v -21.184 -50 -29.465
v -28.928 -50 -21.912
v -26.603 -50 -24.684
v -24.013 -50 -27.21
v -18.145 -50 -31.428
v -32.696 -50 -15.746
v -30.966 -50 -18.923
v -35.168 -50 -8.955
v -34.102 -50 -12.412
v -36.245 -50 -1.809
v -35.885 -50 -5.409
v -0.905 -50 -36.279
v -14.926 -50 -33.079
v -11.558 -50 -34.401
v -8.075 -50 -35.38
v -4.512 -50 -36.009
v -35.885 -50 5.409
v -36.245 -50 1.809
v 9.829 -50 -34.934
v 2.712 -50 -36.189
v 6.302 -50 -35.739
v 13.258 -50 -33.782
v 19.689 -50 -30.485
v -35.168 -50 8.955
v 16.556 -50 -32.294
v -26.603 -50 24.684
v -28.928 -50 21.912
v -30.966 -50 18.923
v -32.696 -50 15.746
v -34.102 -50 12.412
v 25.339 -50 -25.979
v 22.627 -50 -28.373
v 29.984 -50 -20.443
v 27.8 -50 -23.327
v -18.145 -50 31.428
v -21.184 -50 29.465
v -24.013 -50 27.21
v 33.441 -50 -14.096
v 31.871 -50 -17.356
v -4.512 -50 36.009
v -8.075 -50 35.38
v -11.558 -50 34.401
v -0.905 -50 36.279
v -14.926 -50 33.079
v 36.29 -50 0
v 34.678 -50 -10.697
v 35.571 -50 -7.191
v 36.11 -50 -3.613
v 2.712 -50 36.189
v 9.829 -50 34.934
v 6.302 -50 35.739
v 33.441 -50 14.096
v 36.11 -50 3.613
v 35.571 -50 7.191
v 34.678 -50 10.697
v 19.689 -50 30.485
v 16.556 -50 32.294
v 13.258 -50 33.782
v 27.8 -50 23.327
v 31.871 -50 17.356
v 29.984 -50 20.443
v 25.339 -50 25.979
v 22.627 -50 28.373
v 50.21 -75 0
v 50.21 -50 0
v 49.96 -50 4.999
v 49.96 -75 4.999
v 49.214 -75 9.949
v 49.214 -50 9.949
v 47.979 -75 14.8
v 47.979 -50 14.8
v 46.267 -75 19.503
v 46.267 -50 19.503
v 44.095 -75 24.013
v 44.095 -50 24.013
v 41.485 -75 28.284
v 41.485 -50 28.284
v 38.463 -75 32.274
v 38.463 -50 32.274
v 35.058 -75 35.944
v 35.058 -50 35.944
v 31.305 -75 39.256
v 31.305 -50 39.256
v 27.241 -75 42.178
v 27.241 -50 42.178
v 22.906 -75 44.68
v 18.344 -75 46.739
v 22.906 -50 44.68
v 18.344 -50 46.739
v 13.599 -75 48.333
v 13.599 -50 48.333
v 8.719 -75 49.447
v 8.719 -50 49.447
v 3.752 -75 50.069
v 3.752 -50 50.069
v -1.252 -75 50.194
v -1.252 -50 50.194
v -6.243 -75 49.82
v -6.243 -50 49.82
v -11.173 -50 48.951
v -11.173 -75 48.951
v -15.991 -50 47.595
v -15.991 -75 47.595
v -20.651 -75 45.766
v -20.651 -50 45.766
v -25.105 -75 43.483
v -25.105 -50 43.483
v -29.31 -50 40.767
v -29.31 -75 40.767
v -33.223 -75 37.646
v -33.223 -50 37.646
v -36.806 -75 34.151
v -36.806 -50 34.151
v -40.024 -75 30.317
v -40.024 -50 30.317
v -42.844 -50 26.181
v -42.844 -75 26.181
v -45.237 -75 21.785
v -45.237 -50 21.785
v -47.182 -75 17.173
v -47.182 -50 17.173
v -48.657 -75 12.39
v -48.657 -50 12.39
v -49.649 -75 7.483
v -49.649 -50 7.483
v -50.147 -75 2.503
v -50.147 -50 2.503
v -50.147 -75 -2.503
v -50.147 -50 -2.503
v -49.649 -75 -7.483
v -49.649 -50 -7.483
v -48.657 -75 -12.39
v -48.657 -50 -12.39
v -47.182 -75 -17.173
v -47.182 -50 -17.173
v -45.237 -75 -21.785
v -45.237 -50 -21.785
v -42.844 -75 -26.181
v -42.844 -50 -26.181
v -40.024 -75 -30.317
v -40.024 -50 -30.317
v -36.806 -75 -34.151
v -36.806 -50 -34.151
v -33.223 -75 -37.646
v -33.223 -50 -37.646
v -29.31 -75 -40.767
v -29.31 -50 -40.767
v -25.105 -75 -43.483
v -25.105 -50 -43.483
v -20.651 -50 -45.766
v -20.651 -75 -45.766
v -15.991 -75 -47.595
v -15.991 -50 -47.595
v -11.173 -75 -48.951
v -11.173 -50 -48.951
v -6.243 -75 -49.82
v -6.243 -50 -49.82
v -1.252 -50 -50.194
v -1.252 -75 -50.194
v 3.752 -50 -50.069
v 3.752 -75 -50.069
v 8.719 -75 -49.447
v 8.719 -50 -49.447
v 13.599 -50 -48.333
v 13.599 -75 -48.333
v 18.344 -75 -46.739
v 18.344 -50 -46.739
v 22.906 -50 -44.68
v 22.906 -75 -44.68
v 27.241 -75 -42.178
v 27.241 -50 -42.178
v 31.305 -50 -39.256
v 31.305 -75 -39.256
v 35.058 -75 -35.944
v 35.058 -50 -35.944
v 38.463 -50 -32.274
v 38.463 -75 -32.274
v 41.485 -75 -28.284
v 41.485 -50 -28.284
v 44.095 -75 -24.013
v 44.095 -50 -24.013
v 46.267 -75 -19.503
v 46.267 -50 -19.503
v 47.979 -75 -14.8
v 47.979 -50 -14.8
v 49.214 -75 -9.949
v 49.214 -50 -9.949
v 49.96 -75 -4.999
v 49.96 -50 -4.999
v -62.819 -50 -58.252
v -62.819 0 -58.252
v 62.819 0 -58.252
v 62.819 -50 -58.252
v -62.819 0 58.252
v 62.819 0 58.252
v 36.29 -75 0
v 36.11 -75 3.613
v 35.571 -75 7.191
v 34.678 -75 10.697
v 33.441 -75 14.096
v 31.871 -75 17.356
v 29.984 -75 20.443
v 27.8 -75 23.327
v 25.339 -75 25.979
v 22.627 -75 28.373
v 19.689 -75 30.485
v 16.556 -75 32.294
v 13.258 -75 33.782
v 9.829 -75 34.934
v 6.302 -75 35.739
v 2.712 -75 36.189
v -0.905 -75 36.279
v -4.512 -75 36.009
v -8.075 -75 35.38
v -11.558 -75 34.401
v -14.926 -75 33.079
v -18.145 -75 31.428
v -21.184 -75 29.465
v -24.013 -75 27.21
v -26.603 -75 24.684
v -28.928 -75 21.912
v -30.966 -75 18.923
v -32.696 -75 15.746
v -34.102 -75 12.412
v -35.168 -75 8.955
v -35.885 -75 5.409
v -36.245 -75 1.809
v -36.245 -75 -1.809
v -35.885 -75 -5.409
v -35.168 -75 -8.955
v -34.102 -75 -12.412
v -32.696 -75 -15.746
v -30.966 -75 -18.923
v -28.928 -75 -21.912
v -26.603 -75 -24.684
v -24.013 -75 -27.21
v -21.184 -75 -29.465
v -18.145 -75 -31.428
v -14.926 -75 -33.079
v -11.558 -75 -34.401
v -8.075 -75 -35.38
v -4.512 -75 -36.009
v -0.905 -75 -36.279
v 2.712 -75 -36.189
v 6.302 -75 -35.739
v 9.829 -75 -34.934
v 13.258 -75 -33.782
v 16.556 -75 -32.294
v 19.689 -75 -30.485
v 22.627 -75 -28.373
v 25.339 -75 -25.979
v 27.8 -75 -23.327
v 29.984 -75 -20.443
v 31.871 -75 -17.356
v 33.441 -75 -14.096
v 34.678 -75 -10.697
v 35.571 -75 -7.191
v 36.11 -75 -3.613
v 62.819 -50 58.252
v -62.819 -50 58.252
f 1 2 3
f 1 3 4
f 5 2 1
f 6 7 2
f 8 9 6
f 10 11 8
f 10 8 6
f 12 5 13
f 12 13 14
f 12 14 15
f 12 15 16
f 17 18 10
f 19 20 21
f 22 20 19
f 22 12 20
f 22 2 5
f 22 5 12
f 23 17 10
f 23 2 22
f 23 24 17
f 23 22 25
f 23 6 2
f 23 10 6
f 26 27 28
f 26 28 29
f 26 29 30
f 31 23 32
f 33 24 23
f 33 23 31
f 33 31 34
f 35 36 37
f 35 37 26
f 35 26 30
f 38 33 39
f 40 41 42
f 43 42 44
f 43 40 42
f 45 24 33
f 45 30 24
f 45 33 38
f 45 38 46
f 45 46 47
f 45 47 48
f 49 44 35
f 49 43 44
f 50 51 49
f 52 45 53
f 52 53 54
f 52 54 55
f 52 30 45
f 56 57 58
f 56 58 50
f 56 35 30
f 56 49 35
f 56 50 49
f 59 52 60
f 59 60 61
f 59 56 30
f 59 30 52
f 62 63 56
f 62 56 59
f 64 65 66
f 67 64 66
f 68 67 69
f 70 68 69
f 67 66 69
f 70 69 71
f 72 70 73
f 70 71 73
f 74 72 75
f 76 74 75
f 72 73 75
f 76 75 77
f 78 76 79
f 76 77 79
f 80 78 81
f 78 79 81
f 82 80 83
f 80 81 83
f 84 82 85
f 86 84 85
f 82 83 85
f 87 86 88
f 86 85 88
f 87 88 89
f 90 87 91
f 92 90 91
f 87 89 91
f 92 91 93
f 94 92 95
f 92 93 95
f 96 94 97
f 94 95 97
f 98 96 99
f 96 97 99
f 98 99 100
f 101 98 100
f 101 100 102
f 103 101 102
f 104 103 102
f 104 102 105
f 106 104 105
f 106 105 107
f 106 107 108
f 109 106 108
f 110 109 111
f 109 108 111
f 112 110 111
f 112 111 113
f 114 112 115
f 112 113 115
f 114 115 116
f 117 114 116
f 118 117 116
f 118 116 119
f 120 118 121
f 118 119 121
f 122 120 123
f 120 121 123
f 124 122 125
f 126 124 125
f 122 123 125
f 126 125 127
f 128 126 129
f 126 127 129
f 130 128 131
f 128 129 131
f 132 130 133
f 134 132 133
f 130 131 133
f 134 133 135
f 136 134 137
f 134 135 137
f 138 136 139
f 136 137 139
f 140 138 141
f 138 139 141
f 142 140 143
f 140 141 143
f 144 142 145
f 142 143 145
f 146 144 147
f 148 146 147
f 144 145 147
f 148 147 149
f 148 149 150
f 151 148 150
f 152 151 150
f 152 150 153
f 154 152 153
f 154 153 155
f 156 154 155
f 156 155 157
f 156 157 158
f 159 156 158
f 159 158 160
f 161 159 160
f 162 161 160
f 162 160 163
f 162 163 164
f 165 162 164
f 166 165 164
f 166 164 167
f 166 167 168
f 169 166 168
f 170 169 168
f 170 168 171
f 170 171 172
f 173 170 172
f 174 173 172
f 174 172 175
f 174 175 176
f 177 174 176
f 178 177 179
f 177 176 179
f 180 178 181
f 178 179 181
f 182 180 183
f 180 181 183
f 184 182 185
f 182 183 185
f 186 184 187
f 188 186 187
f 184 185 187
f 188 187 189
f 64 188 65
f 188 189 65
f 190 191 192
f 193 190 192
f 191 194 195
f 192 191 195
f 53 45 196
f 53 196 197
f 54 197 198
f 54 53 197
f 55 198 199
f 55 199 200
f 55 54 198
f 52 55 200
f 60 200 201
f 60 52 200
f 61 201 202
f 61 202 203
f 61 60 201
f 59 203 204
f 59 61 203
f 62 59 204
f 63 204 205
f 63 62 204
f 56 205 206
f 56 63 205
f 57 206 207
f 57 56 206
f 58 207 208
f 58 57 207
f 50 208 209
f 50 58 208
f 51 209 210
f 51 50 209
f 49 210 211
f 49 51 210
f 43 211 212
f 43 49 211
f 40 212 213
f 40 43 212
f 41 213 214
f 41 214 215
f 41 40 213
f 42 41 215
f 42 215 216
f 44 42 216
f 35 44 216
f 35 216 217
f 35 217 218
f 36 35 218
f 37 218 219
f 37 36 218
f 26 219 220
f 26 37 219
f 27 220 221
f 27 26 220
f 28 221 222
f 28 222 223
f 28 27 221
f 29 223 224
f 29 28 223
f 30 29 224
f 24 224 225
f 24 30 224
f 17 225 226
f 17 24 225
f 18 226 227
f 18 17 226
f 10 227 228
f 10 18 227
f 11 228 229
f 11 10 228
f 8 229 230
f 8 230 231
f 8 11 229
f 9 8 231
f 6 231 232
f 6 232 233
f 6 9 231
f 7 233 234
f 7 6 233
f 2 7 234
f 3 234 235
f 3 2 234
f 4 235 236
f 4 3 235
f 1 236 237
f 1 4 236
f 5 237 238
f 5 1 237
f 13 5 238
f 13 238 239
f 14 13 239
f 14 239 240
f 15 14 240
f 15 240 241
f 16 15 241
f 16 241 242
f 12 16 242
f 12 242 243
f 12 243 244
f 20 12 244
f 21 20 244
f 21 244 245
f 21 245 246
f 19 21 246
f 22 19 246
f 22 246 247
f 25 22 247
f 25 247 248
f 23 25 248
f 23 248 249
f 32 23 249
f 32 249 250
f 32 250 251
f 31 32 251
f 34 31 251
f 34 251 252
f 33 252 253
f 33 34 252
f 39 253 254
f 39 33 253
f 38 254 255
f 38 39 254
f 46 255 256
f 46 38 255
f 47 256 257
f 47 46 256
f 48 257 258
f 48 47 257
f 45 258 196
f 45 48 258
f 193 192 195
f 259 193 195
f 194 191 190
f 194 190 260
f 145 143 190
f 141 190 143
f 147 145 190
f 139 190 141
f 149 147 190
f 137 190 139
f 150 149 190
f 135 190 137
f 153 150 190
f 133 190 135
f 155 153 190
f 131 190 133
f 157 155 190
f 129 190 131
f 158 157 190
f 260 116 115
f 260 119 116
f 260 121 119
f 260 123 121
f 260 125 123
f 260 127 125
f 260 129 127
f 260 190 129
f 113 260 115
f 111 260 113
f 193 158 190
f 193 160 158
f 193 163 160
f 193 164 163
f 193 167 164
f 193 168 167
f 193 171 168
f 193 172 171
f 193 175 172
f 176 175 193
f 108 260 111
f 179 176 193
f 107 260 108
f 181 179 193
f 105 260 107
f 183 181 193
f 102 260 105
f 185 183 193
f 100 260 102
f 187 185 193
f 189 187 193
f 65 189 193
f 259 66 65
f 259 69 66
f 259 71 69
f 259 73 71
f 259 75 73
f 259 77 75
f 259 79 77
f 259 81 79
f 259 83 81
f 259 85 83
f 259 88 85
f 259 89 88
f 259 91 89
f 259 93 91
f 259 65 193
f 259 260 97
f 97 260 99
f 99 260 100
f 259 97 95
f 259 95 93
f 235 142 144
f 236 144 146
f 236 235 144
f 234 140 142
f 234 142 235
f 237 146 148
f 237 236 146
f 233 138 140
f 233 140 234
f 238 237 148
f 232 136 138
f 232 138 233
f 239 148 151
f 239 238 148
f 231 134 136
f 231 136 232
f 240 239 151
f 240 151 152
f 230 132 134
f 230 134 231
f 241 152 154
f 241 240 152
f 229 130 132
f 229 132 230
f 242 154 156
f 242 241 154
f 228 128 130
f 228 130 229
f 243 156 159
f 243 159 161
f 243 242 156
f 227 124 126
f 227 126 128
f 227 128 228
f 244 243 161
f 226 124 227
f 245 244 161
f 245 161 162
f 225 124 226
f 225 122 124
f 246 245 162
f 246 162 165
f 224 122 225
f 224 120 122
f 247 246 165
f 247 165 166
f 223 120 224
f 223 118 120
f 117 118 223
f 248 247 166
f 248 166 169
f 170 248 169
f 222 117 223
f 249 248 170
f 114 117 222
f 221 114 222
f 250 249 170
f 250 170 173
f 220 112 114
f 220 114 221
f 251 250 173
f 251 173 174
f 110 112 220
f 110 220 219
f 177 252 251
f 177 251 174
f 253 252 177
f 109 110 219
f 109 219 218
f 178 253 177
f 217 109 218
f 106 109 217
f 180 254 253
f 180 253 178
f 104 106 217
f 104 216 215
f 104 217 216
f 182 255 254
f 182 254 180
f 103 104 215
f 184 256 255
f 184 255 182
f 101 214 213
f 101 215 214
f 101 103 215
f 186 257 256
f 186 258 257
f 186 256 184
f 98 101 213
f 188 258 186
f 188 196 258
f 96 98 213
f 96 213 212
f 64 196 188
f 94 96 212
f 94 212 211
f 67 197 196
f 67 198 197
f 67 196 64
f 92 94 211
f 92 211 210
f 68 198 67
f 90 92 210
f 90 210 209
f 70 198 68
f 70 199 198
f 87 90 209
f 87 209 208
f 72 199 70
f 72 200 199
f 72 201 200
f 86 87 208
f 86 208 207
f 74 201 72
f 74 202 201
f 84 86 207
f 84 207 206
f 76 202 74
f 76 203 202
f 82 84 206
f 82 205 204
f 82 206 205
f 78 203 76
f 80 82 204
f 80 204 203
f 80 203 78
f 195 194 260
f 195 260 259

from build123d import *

# Parameters (mm, degrees)
F0_W     = 125.638232
F0_H     = 116.504982
F1_DEPTH = 50
F2_R     = 50.209764
F2_R_2   = 36.290229
F3_DEPTH = 25


with BuildPart() as f1:
    # F0 (on Front) → F1 (new body)
    with BuildSketch(Plane.XZ):
        Rectangle(F0_W, F0_H)
    extrude(amount=F1_DEPTH)

    # F2 (on face) → F3 (join)
    with BuildSketch(Plane.XZ.offset(50)):
        Circle(F2_R)
        Circle(F2_R_2, mode=Mode.SUBTRACT)
    extrude(amount=F3_DEPTH)


solid = f1.part
